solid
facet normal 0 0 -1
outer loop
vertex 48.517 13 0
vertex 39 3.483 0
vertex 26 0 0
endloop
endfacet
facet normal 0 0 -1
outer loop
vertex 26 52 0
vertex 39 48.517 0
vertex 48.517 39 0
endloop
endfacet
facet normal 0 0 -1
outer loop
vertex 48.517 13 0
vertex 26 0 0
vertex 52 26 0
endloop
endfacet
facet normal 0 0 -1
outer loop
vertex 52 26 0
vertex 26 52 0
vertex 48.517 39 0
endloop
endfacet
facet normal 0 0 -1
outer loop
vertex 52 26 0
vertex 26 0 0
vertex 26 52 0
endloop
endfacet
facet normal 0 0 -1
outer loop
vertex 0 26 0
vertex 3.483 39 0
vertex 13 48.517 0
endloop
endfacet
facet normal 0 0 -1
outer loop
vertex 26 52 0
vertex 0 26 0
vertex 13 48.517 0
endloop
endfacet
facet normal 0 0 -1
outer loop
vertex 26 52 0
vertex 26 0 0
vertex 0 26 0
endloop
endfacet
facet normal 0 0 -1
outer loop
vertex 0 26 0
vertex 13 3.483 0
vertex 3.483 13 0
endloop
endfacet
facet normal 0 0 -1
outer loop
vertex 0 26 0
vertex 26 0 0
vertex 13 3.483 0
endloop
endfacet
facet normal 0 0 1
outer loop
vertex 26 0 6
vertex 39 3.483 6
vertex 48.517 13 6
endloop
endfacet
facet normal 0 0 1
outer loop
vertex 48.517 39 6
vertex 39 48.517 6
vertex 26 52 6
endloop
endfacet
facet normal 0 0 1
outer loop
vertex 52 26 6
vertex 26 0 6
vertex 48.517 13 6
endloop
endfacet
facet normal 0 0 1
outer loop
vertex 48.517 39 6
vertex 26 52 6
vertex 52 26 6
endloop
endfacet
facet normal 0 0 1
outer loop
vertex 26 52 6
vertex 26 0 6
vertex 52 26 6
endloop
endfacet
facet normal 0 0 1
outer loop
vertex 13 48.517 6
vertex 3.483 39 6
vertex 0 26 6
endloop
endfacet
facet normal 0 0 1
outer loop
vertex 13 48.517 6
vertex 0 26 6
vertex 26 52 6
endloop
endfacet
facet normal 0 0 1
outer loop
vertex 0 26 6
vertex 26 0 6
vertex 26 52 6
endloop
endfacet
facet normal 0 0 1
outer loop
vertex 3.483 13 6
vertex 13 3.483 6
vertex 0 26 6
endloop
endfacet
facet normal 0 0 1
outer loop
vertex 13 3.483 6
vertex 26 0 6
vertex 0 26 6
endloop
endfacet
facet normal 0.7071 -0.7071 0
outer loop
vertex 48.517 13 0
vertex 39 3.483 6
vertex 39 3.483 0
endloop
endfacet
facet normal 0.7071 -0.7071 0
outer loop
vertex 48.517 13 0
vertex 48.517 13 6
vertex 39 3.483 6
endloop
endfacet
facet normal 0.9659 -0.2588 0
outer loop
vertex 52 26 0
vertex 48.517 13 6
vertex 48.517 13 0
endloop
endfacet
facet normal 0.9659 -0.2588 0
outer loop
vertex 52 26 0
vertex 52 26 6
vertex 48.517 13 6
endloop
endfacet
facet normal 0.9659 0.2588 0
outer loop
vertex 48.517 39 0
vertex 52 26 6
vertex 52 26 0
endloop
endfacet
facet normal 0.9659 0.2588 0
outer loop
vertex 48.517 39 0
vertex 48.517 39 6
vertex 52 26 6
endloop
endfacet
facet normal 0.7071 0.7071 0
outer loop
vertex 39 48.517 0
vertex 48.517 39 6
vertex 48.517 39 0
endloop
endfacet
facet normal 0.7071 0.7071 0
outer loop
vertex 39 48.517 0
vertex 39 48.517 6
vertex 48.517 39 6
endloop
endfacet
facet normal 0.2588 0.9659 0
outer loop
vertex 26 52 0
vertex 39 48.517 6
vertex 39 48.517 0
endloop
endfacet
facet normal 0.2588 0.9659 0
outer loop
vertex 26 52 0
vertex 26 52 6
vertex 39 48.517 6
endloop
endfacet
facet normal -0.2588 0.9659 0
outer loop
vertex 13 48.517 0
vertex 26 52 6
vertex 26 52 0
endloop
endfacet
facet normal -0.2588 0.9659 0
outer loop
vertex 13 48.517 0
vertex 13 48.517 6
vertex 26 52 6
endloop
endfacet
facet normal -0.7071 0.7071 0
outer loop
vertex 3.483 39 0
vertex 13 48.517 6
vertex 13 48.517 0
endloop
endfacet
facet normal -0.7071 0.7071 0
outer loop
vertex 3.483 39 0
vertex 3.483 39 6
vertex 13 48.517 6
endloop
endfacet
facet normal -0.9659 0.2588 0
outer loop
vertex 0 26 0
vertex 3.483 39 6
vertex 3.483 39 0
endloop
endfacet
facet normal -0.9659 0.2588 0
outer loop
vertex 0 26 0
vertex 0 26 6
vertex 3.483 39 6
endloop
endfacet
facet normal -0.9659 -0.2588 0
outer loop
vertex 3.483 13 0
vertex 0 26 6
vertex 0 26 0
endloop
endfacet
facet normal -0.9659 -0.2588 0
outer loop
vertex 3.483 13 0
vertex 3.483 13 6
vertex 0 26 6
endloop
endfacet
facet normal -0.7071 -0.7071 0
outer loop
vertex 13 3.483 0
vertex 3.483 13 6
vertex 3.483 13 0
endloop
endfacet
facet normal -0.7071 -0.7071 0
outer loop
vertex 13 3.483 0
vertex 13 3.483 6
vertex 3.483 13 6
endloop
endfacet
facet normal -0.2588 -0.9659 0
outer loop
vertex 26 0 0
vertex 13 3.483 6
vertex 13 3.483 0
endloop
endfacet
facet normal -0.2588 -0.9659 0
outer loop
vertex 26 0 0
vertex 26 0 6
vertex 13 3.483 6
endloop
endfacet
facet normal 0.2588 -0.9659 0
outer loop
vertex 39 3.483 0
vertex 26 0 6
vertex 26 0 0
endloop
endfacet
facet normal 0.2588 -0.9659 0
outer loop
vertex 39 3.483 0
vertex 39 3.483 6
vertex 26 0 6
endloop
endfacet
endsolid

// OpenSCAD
$fn = 32;

// ----------------------------------------------------------------------
// Eccentric disc: step, 6 mm thick
// ----------------------------------------------------------------------

// --- parameters (mm) ---
profile_height = 6;       // extrusion height
profile_points = 12;      // points of the closed outline

profile = [[0, 26], [3.483, 13], [13, 3.483], [26, 0], [39, 3.483], [48.517, 13], [52, 26], [48.517, 39], [39, 48.517], [26, 52], [13, 48.517], [3.483, 39]];  // single closed polygon, 12 points, counter clockwise

// --- the one profile operation ---
linear_extrude(height = profile_height) polygon(points = profile);
